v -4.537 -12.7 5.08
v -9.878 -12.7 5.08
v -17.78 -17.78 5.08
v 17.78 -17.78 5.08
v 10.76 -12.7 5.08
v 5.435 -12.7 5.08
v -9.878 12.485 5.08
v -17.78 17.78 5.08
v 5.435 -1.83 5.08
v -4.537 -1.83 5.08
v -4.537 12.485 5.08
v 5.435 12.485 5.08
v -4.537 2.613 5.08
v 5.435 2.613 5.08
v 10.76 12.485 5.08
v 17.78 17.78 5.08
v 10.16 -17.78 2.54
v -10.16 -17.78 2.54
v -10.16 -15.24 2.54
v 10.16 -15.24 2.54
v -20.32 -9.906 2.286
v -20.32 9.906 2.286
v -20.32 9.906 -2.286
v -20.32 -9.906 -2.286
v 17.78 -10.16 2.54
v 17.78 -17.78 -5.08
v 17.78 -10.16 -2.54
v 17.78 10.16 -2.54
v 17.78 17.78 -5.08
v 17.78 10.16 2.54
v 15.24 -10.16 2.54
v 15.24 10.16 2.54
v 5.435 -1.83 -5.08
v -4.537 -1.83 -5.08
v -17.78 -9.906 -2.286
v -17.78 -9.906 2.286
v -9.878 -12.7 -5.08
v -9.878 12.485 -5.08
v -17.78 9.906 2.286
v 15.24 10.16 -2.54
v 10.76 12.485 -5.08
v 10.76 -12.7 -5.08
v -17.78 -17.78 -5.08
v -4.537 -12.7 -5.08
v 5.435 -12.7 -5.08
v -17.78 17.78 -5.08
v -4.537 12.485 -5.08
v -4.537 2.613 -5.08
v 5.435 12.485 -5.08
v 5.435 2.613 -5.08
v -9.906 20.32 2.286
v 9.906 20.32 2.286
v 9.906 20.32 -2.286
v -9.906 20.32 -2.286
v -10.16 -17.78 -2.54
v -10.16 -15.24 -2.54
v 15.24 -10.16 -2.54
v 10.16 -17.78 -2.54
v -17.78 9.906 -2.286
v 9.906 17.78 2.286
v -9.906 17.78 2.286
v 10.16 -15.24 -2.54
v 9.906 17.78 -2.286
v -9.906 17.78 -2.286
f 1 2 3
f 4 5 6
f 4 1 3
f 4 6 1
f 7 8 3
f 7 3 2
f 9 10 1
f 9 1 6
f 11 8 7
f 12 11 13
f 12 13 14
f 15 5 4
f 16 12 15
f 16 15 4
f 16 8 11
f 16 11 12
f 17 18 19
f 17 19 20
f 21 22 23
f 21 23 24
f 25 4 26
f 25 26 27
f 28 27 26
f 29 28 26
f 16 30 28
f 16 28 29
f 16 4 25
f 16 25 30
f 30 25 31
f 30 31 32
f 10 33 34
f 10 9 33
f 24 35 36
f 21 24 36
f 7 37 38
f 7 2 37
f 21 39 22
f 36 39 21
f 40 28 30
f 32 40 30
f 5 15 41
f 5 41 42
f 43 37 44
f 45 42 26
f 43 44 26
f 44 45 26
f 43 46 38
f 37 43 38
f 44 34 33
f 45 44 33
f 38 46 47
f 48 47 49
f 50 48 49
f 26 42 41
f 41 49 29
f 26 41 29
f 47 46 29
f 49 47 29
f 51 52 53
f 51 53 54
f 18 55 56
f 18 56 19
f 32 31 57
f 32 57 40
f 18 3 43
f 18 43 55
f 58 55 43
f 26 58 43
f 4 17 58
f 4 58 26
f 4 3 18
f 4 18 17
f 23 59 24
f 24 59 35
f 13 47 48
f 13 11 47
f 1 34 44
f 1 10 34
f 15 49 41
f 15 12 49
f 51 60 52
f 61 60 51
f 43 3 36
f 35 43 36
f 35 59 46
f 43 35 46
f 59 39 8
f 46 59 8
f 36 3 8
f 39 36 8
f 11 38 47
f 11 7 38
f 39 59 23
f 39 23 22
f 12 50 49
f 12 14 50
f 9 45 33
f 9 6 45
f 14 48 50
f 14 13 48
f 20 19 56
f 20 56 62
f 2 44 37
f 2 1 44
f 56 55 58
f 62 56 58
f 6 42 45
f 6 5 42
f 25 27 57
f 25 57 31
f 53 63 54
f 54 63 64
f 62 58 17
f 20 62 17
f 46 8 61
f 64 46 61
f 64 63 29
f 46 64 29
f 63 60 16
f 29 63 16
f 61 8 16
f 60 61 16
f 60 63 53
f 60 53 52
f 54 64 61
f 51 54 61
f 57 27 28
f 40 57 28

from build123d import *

# Parameters (mm, degrees)
F0_W     = 35.56
F0_H     = 35.56
F1_DEPTH = 5.08
F2_W     = 19.812
F2_H     = 4.572
F3_DEPTH = 2.54
F4_W     = 19.812
F4_H     = 4.572
F5_DEPTH = 2.54
F6_W     = 20.32
F6_H     = 5.08
F7_DEPTH = 2.54
F8_W     = 20.32
F8_H     = 5.08
F9_DEPTH = 2.54


with BuildPart() as f1:
    # F0 (on Top) → F1 (new body, symmetric)
    with BuildSketch(Plane.XY):
        Rectangle(F0_W, F0_H)
        Polygon((10.7597222222, 12.4850260417), (10.7597222222, -12.7), (5.4349826389, -12.7), (5.4349826389, -1.8300347222), (-4.5365017361, -1.8300347222), (-4.5365017361, -12.7), (-9.8777777778, -12.7), (-9.8777777778, 12.4850260417), (-4.5365017361, 12.4850260417), (-4.5365017361, 2.6127604167), (5.4349826389, 2.6127604167), (5.4349826389, 12.4850260417), align=None, mode=Mode.SUBTRACT)
    extrude(amount=F1_DEPTH, both=True)

    # F2 (on face) → F3 (join)
    with BuildSketch(Plane(origin=(0, 17.78, 0), x_dir=(-1, 0, 0), z_dir=(0, 1, 0))):
        Rectangle(F2_W, F2_H)
    extrude(amount=F3_DEPTH)

    # F4 (on face) → F5 (join)
    with BuildSketch(Plane(origin=(-17.78, 0, 0), x_dir=(0, -1, 0), z_dir=(-1, 0, 0))):
        Rectangle(F4_W, F4_H)
    extrude(amount=F5_DEPTH)

    # F6 (on face) → F7 (cut)
    with BuildSketch(Plane.XZ.offset(17.78)):
        Rectangle(F6_W, F6_H)
    extrude(amount=-F7_DEPTH, mode=Mode.SUBTRACT)

    # F8 (on face) → F9 (cut)
    with BuildSketch(Plane.YZ.offset(17.78)):
        Rectangle(F8_W, F8_H)
    extrude(amount=-F9_DEPTH, mode=Mode.SUBTRACT)


solid = f1.part
